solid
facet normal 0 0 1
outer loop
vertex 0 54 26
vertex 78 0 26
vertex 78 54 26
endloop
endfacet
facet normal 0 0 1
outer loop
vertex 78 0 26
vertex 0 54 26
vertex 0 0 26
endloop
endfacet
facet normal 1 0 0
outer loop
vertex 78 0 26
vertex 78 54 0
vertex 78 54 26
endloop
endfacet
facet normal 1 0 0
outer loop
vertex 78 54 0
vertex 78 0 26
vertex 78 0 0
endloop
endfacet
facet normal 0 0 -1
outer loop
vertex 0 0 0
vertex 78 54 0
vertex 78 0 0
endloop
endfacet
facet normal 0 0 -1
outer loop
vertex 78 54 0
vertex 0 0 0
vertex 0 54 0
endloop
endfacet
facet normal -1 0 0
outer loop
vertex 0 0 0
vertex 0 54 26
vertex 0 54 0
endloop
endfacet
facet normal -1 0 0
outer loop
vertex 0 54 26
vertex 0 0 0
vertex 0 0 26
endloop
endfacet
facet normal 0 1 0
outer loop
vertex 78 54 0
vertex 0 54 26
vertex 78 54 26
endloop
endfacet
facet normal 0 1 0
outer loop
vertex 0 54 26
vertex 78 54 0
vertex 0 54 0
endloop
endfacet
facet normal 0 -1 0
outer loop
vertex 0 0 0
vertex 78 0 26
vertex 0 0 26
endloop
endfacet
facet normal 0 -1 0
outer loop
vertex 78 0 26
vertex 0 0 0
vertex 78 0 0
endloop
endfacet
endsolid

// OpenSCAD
// Two-part box with a press-fit lid - an enclosure for a small electronics board. NOVEL general part.
//

box_d  = 70;
box_y  = 50;
box_h  = 30;
wall   = 2;
floor  = 2;

lip_d  = 65.6;
lip_y  = 45.6;
lip_h  = 4;
clear  = 0.2;

$fn = 48;

ol     = box_d + 2 * wall + 2 * floor;
oy     = box_y + 2 * wall;
ol_h   = box_h - floor;

difference() {
    cube([ol, oy, ol_h]);                 // box body, open top
    translate([0, 0, ol_h - floor]) cube([ol, oy, floor]);          // solid floor
    for (x = [-1, 1])
        translate([x * (ol / 2 - lip_d / 2 - clear), 0, ol_h - floor])
            cube([lip_d + 2 * clear, lip_y + 2 * clear, lip_h]);    // two lips, open downward
}
